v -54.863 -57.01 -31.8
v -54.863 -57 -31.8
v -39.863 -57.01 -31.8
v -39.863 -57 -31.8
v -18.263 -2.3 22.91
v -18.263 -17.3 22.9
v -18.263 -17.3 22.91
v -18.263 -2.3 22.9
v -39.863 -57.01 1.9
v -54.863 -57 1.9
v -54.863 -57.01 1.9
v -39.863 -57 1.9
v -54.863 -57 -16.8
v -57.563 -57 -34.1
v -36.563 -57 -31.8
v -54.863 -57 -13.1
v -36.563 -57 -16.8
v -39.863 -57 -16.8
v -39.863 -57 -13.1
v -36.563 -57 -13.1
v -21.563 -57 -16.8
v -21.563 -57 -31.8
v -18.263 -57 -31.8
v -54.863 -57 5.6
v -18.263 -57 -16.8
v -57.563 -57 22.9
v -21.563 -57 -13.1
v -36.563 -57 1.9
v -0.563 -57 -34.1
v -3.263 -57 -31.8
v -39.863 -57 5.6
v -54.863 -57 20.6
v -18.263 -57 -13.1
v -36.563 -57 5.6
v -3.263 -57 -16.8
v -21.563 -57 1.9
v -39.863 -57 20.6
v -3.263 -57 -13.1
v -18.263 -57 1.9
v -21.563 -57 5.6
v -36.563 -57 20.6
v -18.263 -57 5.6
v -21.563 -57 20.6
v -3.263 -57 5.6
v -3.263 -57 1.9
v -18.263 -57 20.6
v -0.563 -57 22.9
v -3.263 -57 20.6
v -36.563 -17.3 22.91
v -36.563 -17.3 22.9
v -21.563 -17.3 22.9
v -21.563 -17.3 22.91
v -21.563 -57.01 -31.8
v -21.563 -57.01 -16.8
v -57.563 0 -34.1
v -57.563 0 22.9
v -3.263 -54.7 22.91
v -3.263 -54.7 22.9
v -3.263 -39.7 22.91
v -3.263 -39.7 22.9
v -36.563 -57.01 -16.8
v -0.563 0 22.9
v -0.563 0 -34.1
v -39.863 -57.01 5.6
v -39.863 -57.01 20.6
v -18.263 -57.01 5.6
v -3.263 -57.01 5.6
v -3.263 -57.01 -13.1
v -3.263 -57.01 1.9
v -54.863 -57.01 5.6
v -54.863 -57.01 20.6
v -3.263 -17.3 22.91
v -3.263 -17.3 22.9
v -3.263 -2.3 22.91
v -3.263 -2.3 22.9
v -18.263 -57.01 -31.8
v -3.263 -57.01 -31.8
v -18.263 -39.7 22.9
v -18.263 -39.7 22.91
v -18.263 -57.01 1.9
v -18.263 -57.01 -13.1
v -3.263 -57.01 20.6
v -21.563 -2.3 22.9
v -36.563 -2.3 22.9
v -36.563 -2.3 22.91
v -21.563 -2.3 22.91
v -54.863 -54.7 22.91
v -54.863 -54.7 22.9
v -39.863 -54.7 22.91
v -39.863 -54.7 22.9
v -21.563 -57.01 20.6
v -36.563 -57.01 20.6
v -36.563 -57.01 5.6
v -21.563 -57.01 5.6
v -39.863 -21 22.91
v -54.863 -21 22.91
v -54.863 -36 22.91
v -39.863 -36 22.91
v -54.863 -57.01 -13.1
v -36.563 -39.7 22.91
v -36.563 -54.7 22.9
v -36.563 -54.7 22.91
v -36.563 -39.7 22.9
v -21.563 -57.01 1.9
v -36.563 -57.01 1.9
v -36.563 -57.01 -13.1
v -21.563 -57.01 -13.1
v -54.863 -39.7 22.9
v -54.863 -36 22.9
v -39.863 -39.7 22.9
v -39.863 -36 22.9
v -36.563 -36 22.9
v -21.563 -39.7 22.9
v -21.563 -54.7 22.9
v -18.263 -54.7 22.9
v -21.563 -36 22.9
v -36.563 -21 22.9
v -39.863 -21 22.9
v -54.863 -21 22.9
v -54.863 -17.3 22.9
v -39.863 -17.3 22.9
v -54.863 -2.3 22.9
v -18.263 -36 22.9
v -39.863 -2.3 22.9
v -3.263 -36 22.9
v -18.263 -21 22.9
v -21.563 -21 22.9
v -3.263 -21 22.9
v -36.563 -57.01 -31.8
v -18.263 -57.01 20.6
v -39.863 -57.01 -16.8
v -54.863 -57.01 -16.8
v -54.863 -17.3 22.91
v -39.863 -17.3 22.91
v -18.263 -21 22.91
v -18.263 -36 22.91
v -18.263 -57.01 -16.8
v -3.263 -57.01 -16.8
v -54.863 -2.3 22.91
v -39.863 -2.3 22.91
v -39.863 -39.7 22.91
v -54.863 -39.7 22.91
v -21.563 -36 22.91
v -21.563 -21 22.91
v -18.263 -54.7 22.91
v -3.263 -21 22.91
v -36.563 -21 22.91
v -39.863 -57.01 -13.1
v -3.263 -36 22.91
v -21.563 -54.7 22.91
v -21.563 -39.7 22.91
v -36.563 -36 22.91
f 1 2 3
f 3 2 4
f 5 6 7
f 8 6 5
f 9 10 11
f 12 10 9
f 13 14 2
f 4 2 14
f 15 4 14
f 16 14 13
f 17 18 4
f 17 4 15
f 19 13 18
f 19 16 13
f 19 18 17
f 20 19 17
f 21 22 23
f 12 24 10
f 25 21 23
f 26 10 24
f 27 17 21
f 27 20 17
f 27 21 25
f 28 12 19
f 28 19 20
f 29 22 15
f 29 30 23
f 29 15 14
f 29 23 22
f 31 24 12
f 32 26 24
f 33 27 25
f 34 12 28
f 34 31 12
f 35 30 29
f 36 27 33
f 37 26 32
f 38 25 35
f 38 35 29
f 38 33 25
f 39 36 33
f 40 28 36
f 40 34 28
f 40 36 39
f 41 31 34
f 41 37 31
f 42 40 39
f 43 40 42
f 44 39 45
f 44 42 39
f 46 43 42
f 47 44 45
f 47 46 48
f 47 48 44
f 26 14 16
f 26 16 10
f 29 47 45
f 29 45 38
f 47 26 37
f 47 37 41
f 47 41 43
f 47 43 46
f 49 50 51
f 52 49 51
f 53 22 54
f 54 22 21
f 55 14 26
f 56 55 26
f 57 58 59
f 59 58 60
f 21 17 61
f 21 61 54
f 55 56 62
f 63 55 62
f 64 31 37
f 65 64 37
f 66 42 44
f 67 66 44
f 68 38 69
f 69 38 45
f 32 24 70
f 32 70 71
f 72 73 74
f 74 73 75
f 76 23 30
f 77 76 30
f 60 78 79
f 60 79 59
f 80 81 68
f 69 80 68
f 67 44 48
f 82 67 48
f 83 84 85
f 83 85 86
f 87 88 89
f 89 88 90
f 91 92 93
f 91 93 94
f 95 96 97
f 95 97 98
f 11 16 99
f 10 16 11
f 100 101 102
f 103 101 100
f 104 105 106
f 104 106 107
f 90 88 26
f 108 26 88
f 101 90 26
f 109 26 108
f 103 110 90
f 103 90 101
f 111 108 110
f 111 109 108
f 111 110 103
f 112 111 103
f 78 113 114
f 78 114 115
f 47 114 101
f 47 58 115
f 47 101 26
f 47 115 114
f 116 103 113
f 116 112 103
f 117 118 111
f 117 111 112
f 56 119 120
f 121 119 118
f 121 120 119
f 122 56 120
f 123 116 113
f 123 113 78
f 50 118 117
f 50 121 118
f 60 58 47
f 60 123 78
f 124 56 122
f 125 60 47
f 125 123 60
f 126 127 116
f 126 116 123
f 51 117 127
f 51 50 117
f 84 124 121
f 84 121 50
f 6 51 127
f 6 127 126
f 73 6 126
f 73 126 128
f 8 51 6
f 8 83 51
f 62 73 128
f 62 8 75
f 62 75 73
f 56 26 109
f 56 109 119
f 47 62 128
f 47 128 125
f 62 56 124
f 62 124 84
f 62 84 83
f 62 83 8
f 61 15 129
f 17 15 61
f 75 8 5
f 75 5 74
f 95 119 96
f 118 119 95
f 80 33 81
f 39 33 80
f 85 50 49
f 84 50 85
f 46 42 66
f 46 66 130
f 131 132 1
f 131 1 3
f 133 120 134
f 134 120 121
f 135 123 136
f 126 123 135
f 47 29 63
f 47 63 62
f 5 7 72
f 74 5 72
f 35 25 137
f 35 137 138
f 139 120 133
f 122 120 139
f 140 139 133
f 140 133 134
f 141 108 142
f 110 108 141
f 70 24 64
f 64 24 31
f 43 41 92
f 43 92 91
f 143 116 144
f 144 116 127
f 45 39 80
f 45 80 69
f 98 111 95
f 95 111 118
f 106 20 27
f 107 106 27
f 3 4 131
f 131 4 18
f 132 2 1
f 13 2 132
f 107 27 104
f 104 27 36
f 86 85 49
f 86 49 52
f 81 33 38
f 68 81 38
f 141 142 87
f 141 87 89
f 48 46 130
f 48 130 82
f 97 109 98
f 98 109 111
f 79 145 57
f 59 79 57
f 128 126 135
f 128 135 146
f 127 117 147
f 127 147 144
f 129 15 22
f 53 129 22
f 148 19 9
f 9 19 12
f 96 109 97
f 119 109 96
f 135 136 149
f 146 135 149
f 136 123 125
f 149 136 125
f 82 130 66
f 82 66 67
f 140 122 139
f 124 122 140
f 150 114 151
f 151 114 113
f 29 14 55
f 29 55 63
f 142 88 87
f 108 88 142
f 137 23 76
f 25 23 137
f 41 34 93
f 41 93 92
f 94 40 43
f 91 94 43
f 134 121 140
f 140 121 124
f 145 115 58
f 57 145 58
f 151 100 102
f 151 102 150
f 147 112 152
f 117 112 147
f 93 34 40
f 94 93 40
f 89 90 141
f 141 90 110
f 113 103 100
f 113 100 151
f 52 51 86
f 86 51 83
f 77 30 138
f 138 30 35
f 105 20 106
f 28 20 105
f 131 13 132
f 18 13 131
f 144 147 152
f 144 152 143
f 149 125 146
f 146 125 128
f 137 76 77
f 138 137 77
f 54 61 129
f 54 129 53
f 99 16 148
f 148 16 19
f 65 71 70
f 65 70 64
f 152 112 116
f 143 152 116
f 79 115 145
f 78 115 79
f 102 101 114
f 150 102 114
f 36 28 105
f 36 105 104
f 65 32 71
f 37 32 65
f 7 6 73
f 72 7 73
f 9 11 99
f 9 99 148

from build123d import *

# Parameters (mm, degrees)
F0_W     = 57
F0_H     = 57
F1_DEPTH = 57
F2_W     = 15
F2_H     = 15
F3_DEPTH = 0.01
F4_W     = 15
F4_H     = 15
F5_DEPTH = 0.01


with BuildPart() as f1:
    # F0 (on Front) → F1 (new body)
    with BuildSketch(Plane.XZ):
        with Locations((-29.06329, -5.599806)):
            Rectangle(F0_W, F0_H)
    extrude(amount=F1_DEPTH)

    # F2 (on face) → F3 (join)
    with BuildSketch(Plane.XY.offset(22.900194)):
        with Locations((-10.76329, -9.8)):
            Rectangle(F2_W, F2_H)
        with Locations((-10.76329, -28.5)):
            Rectangle(F2_W, F2_H)
        with Locations((-10.76329, -47.2)):
            Rectangle(F2_W, F2_H)
        with Locations((-29.06329, -47.2)):
            Rectangle(F2_W, F2_H)
        with Locations((-29.06329, -28.5)):
            Rectangle(F2_W, F2_H)
        with Locations((-29.06329, -9.8)):
            Rectangle(F2_W, F2_H)
        with Locations((-47.36329, -47.2)):
            Rectangle(F2_W, F2_H)
        with Locations((-47.36329, -28.5)):
            Rectangle(F2_W, F2_H)
        with Locations((-47.36329, -9.8)):
            Rectangle(F2_W, F2_H)
    extrude(amount=F3_DEPTH)

    # F4 (on face) → F5 (join)
    with BuildSketch(Plane.XZ.offset(57)):
        with Locations((-10.76329, 13.100194)):
            Rectangle(F4_W, F4_H)
        with Locations((-10.76329, -5.599806)):
            Rectangle(F4_W, F4_H)
        with Locations((-10.76329, -24.299806)):
            Rectangle(F4_W, F4_H)
        with Locations((-29.06329, -24.299806)):
            Rectangle(F4_W, F4_H)
        with Locations((-29.06329, -5.599806)):
            Rectangle(F4_W, F4_H)
        with Locations((-29.06329, 13.100194)):
            Rectangle(F4_W, F4_H)
        with Locations((-47.36329, -24.299806)):
            Rectangle(F4_W, F4_H)
        with Locations((-47.36329, -5.599806)):
            Rectangle(F4_W, F4_H)
        with Locations((-47.36329, 13.100194)):
            Rectangle(F4_W, F4_H)
    extrude(amount=F5_DEPTH)


solid = f1.part
